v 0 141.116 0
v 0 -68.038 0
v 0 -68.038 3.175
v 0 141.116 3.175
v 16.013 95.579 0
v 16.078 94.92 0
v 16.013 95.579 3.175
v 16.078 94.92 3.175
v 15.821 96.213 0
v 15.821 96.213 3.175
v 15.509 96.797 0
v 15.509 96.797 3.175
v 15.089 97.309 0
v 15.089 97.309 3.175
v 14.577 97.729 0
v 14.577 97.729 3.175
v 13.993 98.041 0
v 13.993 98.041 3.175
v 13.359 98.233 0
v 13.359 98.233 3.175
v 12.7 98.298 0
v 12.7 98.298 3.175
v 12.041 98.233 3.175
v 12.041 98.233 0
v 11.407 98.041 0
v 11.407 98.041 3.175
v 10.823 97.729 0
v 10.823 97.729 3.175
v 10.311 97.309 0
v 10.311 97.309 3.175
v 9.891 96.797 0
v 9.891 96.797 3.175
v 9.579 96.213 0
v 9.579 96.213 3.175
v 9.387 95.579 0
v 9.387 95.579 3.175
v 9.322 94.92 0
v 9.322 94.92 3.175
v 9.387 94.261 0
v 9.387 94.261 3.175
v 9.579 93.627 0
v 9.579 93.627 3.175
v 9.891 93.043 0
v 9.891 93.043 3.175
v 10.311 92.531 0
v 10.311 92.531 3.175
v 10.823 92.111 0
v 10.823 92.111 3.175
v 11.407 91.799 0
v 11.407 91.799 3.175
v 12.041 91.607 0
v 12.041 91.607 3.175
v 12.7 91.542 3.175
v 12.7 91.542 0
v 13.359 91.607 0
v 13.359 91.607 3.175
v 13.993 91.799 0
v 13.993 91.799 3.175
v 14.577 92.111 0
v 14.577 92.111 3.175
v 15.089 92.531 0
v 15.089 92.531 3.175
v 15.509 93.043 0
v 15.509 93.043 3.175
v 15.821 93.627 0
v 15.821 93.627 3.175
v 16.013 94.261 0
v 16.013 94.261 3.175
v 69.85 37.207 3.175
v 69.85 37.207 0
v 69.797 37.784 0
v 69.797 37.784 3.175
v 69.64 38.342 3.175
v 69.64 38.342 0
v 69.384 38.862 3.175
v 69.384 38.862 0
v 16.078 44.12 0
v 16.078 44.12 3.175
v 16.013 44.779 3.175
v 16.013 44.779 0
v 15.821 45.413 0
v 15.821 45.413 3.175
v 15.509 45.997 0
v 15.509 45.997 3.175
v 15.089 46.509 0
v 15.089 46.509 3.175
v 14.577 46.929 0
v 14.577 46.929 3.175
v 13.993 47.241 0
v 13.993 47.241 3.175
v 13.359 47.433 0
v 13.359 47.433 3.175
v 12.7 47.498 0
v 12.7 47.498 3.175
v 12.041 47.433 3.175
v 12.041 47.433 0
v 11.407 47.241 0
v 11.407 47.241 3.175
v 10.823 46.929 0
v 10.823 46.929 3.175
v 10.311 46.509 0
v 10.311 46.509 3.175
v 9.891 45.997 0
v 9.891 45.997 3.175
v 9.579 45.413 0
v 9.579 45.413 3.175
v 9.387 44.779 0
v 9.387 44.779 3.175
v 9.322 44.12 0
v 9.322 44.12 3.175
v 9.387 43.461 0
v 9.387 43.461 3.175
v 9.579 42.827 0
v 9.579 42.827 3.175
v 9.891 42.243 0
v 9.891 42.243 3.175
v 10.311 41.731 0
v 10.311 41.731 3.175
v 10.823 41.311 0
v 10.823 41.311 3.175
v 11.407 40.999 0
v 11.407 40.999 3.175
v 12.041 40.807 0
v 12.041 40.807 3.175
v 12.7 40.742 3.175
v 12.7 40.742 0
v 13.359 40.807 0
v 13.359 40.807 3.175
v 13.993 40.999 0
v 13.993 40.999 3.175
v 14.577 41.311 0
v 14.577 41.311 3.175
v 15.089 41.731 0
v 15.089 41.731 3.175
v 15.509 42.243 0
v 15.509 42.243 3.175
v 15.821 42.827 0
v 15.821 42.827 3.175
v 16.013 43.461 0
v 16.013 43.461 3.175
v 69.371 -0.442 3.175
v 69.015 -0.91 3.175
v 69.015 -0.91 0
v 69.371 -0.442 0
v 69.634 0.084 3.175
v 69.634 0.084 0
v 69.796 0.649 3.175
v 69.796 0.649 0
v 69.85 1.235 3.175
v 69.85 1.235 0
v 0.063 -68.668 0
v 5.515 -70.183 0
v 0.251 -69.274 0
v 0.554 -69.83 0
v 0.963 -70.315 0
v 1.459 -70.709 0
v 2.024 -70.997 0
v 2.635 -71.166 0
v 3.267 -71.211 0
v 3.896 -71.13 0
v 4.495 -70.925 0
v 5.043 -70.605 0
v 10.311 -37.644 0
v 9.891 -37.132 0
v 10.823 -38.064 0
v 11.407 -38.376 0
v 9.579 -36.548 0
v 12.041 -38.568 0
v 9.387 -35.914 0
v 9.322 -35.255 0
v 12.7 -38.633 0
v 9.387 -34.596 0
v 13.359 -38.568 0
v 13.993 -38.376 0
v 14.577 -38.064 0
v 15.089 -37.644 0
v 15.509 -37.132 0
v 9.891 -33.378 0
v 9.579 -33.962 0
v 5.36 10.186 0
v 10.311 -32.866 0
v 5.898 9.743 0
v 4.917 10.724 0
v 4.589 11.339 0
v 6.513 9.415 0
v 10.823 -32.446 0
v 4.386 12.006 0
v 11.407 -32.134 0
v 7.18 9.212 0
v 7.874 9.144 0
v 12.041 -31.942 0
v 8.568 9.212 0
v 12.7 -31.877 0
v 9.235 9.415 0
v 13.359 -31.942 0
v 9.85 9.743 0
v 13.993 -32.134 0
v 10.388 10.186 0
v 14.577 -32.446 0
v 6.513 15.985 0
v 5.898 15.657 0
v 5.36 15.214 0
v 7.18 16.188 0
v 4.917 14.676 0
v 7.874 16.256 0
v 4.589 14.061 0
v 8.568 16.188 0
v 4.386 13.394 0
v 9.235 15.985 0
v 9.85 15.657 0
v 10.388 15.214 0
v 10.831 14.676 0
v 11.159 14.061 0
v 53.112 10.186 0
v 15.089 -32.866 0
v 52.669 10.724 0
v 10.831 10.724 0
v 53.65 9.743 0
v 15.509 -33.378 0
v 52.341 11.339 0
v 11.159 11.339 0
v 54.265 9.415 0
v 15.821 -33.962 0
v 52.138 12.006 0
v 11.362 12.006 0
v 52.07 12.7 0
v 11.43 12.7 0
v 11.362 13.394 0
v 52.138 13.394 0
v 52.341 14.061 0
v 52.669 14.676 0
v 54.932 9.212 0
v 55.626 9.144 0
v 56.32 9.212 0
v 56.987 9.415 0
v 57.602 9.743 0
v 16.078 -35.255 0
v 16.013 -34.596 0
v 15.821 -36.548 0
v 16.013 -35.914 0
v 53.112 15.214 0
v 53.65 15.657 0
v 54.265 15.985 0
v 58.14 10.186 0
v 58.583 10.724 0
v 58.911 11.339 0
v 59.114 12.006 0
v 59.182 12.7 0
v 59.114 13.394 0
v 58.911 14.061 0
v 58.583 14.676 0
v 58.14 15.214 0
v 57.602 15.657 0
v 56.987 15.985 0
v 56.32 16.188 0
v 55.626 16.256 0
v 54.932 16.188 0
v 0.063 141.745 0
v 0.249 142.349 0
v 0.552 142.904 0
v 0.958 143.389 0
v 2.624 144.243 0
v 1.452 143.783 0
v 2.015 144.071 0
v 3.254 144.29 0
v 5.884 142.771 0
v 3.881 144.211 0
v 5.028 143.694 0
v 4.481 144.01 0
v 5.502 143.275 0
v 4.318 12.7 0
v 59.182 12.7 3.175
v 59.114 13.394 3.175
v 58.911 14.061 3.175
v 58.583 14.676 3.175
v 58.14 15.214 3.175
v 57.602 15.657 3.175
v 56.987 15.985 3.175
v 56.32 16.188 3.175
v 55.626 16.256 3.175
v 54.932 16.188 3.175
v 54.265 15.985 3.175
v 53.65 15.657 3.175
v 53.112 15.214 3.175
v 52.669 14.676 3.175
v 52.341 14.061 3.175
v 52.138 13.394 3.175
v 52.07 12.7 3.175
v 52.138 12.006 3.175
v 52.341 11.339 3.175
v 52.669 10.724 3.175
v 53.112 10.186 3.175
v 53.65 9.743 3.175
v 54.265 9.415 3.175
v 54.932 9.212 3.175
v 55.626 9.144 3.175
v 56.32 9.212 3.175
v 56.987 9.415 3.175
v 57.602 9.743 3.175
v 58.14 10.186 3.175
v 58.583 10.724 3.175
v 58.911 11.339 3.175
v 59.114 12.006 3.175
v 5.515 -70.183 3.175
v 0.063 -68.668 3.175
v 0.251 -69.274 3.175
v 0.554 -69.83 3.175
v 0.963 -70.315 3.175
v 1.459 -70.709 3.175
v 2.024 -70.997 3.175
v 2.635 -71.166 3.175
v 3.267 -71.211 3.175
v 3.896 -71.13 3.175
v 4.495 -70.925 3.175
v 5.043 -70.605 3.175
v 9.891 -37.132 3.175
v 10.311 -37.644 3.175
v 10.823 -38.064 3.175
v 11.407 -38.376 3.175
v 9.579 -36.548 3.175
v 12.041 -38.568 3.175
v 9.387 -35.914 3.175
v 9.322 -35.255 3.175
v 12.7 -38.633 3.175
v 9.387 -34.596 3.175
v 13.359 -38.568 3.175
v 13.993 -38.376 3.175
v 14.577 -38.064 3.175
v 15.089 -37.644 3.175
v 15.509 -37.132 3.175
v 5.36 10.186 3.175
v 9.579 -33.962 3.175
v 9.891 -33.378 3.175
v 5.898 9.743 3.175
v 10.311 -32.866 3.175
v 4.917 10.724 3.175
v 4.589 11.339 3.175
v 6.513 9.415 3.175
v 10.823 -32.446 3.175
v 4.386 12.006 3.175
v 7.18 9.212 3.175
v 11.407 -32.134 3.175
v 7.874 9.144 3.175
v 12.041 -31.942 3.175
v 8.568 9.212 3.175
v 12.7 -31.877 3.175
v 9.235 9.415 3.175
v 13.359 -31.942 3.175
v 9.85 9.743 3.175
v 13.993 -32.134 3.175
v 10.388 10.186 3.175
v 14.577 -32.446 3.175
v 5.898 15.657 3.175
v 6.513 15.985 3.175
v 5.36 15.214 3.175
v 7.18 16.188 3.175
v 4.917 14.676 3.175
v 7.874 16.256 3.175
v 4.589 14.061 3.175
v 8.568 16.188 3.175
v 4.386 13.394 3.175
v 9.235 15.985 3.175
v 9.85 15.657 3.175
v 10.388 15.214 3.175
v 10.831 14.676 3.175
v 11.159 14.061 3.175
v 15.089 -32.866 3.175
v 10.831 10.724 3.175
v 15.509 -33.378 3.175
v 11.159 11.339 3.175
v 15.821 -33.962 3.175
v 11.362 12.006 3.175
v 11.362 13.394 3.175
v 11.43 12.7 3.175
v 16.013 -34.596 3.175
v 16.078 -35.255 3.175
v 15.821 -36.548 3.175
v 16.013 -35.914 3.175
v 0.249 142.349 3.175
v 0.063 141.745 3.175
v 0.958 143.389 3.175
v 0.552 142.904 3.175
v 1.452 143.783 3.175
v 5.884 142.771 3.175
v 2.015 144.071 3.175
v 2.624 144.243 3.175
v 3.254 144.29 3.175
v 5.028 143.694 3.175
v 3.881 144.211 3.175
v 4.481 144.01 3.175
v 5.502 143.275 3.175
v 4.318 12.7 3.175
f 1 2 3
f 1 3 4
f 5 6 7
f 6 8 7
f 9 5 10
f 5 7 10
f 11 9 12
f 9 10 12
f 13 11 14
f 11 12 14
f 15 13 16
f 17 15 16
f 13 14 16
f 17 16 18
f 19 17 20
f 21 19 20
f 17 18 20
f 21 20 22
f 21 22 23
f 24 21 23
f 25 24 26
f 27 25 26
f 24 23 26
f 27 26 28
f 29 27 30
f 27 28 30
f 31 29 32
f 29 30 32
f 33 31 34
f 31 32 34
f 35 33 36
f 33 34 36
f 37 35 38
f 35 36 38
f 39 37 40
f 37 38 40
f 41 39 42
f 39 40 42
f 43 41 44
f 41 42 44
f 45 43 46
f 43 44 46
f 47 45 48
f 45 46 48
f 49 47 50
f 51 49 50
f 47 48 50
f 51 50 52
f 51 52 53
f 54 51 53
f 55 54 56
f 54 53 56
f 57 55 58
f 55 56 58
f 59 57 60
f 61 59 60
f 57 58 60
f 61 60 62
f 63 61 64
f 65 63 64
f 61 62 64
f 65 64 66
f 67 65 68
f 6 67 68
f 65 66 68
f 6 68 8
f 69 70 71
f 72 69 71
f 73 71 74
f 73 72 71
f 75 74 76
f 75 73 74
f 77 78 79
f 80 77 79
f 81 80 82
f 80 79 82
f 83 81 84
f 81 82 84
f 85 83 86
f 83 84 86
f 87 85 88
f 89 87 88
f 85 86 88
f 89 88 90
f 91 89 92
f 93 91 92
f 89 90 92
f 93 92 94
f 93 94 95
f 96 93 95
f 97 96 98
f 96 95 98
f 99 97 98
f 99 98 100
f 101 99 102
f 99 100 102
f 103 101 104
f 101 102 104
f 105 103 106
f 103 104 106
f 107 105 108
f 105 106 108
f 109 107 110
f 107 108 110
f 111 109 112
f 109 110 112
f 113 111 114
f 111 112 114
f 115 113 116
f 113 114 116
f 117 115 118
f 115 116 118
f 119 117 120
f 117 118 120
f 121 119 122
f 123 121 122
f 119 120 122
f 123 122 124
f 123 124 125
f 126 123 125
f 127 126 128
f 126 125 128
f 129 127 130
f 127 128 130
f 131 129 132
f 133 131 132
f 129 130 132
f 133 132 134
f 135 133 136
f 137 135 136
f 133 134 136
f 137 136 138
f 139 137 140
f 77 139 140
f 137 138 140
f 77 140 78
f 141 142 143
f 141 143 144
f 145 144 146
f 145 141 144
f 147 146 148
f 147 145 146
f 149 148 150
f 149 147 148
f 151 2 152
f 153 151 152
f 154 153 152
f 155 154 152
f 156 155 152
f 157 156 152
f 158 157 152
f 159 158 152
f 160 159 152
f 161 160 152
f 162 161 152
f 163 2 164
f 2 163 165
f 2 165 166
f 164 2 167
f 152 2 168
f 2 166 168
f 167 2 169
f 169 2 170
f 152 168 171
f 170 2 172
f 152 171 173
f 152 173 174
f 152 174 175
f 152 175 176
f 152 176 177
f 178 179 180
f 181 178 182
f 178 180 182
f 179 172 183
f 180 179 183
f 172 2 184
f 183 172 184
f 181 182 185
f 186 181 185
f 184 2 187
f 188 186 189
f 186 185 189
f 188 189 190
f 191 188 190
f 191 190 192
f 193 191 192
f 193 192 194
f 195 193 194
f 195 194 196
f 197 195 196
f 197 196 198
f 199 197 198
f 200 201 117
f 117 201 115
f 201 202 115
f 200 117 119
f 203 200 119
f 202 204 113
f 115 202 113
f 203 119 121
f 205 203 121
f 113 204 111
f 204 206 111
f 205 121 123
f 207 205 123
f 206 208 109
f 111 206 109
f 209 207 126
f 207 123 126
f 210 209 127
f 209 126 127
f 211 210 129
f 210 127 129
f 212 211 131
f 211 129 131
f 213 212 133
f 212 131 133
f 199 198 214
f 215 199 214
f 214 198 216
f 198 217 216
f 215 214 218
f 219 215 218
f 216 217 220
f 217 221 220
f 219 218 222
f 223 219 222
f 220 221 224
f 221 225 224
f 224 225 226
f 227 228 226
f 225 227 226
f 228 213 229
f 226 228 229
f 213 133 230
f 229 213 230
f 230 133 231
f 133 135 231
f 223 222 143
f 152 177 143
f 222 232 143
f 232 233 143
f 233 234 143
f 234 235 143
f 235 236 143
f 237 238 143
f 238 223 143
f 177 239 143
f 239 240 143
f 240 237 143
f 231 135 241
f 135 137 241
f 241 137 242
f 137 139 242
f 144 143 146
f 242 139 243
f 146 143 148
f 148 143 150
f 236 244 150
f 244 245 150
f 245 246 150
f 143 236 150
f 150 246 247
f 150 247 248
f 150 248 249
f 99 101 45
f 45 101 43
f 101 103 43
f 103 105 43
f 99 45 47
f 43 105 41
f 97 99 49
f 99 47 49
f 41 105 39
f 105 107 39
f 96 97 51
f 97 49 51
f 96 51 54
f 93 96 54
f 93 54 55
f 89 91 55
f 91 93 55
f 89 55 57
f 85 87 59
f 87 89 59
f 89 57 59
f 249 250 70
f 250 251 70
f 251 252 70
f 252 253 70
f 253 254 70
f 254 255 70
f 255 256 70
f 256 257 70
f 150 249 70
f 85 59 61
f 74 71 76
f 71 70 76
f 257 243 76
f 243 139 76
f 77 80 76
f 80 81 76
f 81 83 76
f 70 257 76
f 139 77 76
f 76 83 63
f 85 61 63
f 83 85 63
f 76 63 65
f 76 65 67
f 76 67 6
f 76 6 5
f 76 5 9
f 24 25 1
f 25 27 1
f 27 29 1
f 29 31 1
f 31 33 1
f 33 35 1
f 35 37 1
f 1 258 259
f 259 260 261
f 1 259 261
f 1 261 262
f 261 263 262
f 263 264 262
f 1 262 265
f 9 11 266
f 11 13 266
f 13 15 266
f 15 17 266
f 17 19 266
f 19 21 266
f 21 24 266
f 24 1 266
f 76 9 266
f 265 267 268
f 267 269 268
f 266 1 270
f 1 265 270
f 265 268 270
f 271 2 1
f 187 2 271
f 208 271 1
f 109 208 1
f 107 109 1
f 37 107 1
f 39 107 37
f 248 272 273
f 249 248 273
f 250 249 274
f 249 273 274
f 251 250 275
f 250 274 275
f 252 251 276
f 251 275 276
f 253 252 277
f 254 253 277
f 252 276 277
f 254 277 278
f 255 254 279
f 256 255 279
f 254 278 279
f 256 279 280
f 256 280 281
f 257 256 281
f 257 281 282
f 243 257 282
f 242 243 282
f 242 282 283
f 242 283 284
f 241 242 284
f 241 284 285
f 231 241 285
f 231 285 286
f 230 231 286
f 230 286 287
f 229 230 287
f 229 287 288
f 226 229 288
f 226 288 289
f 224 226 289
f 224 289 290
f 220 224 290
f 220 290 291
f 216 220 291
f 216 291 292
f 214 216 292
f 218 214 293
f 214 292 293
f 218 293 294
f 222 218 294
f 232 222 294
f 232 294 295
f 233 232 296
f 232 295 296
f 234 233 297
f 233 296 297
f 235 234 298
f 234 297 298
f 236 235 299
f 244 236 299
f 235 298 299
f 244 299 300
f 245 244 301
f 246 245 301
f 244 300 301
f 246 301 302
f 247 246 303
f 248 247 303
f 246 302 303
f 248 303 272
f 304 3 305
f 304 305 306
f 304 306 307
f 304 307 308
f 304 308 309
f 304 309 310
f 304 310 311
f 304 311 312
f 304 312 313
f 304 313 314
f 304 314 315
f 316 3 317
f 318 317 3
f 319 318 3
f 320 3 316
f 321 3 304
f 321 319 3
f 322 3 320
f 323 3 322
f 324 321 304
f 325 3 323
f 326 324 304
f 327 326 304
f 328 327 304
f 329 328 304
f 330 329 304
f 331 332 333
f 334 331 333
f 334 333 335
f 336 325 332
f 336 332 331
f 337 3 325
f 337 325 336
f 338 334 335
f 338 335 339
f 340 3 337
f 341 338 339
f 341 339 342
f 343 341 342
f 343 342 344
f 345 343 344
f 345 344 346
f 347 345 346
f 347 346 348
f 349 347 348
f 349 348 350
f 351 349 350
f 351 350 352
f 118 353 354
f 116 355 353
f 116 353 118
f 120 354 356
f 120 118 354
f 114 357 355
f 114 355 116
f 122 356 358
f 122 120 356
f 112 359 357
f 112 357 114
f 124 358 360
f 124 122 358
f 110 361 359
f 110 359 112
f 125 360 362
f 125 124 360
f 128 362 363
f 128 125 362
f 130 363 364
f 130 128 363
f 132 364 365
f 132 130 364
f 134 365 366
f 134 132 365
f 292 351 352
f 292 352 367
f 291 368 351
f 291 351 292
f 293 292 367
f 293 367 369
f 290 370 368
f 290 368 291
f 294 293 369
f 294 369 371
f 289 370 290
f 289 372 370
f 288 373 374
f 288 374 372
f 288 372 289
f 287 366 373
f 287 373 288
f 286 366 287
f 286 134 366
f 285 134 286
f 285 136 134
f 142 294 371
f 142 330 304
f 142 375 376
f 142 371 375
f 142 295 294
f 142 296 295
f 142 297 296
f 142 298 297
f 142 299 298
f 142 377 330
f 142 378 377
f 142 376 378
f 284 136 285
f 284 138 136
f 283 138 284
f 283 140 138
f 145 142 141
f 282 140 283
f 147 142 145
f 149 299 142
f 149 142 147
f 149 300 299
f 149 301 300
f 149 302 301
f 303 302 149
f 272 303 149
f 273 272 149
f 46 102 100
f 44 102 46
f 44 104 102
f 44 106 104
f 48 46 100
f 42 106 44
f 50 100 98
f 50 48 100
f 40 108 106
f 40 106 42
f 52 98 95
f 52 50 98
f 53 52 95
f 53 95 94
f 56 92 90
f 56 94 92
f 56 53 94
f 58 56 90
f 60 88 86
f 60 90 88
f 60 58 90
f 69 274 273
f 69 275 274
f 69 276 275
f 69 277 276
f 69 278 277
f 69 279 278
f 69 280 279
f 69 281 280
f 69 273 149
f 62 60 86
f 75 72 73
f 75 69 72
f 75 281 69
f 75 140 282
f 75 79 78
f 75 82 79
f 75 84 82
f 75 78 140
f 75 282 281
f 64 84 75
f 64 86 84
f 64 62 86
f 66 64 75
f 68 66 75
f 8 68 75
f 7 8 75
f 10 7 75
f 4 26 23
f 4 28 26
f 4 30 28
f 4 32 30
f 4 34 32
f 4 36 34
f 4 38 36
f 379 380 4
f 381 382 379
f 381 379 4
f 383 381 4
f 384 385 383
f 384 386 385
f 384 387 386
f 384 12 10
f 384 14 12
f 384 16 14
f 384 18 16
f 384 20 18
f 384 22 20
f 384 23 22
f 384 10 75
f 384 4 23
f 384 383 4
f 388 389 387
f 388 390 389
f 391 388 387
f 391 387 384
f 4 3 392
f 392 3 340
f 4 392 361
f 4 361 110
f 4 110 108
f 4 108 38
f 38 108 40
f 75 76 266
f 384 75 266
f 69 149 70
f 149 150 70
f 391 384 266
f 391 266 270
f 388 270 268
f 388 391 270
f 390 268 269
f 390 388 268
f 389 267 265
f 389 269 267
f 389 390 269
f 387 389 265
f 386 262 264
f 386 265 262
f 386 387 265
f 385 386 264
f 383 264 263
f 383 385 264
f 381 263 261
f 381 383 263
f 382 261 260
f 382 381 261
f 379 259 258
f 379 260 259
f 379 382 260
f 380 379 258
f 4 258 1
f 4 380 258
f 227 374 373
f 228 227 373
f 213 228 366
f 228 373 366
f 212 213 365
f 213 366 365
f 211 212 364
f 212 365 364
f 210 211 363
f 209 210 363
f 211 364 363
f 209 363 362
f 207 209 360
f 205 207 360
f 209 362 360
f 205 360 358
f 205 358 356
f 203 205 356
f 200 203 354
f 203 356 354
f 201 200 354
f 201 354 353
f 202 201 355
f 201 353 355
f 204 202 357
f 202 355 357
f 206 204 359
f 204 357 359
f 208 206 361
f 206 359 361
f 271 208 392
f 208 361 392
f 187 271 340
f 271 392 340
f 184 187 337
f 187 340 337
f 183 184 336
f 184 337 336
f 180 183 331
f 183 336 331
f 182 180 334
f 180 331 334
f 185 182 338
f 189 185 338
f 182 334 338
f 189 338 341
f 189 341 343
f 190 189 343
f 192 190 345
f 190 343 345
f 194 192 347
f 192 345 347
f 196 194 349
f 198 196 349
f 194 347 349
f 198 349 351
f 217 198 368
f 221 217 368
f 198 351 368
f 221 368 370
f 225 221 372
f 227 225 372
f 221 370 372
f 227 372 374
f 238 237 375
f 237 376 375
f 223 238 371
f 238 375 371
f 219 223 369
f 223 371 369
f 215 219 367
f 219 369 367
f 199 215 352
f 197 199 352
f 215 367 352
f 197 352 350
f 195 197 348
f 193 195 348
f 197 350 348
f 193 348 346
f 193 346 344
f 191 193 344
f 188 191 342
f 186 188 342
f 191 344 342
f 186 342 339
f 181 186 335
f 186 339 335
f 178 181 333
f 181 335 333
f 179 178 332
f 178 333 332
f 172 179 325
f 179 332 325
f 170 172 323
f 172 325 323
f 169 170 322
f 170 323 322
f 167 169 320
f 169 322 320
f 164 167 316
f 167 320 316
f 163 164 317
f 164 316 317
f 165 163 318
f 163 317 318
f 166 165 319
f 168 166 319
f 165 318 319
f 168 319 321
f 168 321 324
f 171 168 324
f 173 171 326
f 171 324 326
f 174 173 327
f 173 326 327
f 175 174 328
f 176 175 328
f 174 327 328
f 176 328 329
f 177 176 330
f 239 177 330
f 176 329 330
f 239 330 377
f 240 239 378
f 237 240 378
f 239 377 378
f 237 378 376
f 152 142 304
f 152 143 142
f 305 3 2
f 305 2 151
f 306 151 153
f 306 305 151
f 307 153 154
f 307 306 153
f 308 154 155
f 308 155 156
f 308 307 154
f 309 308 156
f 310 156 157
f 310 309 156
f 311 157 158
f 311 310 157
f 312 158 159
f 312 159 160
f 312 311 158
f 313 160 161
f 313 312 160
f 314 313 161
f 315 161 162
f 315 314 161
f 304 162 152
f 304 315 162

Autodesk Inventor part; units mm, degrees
ref_plane "YZ Plane" through (0, 0, 0) normal (1, 0, 0) x (0, 1, 0)
ref_plane "XZ Plane" through (0, 0, 0) normal (0, 1, 0) x (-1, 0, 0)
ref_plane "XY Plane" through (0, 0, 0) normal (0, 0, 1) x (1, 0, 0)
sketch "Sketch1" plane through (0, 0, 0) normal (0, 0, 1) x (1, 0, 0)
  line L0 (69.85, 0) -> (69.85, 38.1)
  line L1 (69.85, 38.1) -> (0, 152.4)
  line L2 (0, 152.4) -> (0, 0)
  line L3 (69.85, 0) -> (0, -76.2)
  line L4 (0, -76.2) -> (0, 0)
  dimension "d1" = 38.1
  dimension "d2" = 152.4
  dimension "d24" = 76.2
  dimension "d25" = 69.85
  dimension "d26" = 69.85
extrude "Extrusion1" add sketch "Sketch1" along normal blind 3.175
sketch "Sketch2" plane through (0, 0, 3.175) normal (0, 0, 1) x (1, 0, 0)
  line L0 (0, 0) -> (69.85, 0) projected
  line L1 (69.85, 0) -> (69.85, 38.1) projected
  line L2 (0, 152.4) -> (0, -76.2) projected
  circle A0 centre (7.874, 12.7) radius 3.556
  circle A1 centre (55.626, 12.7) radius 3.556
  dimension "d5" = 7.112
  dimension "d6" = 7.112
  dimension "d7" = 12.7
  dimension "d8" = 12.7
  dimension "d9" = 14.224
  dimension "d11" = 7.874
extrude "Extrusion2" cut sketch "Sketch2" against normal blind 25.4
fillet "Fillet1" radius 3.175 1 edges at (0, 152.4, 1.5875)
sketch "Sketch3" plane through (0, 0, 3.175) normal (0, 0, 1) x (1, 0, 0)
  line L0 (0, 141.1158) -> (0, -76.2) projected
  line L1 (0, 0) -> (69.85, 0) projected
  circle A0 centre (12.7, 94.9198) radius 3.3782
  circle A1 centre (12.7, 44.1198) radius 3.3782
  dimension "d15" = 6.7564
  dimension "d16" = 6.7564
  dimension "d17" = 12.7
  dimension "d18" = 12.7
  dimension "d19" = 44.1198
  dimension "d20" = 50.8
extrude "Extrusion3" cut sketch "Sketch3" against normal blind 25.4
fillet "Fillet2" radius 3.175 2 edges at (69.85, 0, 1.5875) (69.85, 38.1, 1.5875)
fillet "Fillet3" radius 3.175 1 edges at (0, -76.2, 1.5875)
sketch "Sketch4" plane through (0, 0, 3.175) normal (0, 0, 1) x (1, 0, 0)
  line L0 (0, 141.1158) -> (0, -68.0377) projected
  circle A0 centre (12.7, 44.1198) radius 3.3782 projected
  circle A1 centre (12.7, -35.2552) radius 3.3782
  point P0 (0, 0)
  dimension "d28" = 6.7564
  dimension "d29" = 79.375
  dimension "d30" = 12.7
extrude "Extrusion4" cut sketch "Sketch4" against normal blind 25.4 contours A1
sketch "Sketch5" plane through (0, 0, 3.175) normal (0, 0, 1) x (1, 0, 0)
  circle A0 centre (12.7, 44.1198) radius 3.3782 projected
  circle A1 centre (12.7, 94.9198) radius 3.3782 projected
  point P0 (0, 0)
extrude "Extrusion5" cut sketch "Sketch5" against normal blind 25.4
properties part number "Ninja cylinder support bracket"
